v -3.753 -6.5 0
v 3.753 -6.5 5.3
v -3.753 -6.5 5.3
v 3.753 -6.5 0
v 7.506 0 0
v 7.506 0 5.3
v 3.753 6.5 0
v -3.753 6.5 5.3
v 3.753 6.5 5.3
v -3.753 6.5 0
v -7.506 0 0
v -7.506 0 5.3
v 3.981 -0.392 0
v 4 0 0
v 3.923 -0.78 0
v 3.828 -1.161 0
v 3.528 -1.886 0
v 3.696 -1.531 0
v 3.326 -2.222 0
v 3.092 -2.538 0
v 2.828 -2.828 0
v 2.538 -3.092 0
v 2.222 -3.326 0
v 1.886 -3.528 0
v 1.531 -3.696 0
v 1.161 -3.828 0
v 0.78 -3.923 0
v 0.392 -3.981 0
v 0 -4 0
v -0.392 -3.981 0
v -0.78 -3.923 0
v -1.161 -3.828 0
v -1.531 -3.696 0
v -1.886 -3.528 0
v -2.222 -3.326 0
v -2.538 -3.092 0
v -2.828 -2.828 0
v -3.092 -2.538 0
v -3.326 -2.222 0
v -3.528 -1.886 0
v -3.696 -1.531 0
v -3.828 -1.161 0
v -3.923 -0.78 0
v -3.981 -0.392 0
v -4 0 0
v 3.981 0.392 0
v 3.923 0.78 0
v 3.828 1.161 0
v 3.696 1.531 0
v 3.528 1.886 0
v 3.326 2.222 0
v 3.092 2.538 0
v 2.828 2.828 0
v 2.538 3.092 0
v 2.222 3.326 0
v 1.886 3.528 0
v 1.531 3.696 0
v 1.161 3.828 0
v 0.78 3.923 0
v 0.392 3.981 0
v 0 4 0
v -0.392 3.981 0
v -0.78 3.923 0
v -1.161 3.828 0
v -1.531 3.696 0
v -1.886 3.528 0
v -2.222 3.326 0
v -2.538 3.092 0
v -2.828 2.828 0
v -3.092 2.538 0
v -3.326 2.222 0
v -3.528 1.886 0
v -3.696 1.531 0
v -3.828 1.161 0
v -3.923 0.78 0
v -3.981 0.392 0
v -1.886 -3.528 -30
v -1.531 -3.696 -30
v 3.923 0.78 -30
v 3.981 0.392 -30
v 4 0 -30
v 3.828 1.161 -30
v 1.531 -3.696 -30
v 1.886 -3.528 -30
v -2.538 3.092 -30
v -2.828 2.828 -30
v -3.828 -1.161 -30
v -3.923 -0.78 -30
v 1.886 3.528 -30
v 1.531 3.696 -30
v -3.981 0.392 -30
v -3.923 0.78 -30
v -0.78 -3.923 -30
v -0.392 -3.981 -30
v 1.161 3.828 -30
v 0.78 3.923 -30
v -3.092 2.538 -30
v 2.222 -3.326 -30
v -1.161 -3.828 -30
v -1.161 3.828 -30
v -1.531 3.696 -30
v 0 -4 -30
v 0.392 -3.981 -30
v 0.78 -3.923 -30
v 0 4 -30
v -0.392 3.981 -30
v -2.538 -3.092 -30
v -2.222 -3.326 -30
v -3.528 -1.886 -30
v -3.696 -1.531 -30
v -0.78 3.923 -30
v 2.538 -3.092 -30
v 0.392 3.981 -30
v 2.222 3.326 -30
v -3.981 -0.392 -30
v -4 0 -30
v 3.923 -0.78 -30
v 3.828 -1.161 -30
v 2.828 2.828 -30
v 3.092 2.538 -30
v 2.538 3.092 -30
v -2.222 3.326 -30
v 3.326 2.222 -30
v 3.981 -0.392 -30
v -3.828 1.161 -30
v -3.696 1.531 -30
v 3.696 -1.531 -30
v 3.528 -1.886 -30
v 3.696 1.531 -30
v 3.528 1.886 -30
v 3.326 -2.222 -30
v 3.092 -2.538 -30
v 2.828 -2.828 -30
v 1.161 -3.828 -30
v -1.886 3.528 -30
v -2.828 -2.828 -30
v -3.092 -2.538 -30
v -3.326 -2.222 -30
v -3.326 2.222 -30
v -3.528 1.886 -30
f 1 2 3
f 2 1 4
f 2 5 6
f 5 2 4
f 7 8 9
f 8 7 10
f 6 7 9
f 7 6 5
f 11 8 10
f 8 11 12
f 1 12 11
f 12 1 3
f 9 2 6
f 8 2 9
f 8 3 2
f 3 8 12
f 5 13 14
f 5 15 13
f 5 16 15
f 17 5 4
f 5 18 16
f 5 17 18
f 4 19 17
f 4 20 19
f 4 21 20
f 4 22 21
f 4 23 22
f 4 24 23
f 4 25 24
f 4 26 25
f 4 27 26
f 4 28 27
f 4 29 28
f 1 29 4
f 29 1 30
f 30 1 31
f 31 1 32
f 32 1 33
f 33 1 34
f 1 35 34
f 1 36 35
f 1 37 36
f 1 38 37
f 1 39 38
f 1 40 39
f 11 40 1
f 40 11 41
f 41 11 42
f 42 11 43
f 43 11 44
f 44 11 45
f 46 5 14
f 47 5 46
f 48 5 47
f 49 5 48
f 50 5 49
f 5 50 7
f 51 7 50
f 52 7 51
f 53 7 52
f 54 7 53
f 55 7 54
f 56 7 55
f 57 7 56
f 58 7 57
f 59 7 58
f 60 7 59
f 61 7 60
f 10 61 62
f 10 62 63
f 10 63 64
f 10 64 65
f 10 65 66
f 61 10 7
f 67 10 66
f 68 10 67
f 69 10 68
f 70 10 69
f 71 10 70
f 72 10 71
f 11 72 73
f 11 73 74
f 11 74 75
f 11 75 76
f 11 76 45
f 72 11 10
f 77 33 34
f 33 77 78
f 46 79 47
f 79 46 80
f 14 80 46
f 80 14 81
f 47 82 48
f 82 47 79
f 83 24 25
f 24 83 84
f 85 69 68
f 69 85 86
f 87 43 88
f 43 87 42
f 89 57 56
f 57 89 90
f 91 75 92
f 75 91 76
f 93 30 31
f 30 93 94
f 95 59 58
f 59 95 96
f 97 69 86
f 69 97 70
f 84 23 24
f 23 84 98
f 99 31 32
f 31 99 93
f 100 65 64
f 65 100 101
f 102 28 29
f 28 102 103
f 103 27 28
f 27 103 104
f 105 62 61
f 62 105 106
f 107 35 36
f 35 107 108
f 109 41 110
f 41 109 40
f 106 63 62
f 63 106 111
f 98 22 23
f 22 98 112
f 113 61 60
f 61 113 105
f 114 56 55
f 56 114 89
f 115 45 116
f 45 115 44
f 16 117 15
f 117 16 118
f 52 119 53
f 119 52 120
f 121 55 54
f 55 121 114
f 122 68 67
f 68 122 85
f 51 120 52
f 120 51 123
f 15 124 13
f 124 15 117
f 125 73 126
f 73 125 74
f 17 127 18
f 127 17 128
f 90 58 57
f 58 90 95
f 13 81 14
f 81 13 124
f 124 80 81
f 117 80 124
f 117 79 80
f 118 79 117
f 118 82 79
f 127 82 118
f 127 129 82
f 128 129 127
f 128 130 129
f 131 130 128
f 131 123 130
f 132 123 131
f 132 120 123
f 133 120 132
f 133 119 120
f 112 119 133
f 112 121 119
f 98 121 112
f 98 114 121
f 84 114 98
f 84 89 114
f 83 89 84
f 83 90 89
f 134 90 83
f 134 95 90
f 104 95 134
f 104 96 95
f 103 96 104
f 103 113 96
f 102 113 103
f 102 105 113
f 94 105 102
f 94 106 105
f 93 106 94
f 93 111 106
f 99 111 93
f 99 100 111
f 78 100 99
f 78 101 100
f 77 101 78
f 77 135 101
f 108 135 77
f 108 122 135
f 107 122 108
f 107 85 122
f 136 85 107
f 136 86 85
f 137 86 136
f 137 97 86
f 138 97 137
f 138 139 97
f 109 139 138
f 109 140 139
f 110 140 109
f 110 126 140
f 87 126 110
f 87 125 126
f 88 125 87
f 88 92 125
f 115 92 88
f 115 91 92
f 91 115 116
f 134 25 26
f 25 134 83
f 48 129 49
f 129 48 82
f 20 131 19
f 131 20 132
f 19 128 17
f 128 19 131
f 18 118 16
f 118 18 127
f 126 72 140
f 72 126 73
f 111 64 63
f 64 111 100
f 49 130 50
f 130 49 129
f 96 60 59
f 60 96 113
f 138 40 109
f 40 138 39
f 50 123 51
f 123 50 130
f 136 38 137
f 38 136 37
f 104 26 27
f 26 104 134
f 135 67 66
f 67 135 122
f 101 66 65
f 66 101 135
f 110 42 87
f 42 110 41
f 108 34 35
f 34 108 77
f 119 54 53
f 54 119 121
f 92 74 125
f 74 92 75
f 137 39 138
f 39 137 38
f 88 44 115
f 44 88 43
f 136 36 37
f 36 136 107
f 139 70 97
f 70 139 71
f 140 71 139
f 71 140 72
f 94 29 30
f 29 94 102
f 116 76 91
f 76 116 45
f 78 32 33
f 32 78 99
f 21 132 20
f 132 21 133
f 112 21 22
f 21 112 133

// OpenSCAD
$fn = 64;

across_flats = 13;
head_height  = 5.3;
shank_diameter = 8;
shank_length = 30;

hex_circumdiameter = across_flats / cos(30);

union() {
    cylinder(h = head_height, d = hex_circumdiameter, $fn = 6);

    translate([0, 0, -shank_length])
        cylinder(h = shank_length, d = shank_diameter);
}
